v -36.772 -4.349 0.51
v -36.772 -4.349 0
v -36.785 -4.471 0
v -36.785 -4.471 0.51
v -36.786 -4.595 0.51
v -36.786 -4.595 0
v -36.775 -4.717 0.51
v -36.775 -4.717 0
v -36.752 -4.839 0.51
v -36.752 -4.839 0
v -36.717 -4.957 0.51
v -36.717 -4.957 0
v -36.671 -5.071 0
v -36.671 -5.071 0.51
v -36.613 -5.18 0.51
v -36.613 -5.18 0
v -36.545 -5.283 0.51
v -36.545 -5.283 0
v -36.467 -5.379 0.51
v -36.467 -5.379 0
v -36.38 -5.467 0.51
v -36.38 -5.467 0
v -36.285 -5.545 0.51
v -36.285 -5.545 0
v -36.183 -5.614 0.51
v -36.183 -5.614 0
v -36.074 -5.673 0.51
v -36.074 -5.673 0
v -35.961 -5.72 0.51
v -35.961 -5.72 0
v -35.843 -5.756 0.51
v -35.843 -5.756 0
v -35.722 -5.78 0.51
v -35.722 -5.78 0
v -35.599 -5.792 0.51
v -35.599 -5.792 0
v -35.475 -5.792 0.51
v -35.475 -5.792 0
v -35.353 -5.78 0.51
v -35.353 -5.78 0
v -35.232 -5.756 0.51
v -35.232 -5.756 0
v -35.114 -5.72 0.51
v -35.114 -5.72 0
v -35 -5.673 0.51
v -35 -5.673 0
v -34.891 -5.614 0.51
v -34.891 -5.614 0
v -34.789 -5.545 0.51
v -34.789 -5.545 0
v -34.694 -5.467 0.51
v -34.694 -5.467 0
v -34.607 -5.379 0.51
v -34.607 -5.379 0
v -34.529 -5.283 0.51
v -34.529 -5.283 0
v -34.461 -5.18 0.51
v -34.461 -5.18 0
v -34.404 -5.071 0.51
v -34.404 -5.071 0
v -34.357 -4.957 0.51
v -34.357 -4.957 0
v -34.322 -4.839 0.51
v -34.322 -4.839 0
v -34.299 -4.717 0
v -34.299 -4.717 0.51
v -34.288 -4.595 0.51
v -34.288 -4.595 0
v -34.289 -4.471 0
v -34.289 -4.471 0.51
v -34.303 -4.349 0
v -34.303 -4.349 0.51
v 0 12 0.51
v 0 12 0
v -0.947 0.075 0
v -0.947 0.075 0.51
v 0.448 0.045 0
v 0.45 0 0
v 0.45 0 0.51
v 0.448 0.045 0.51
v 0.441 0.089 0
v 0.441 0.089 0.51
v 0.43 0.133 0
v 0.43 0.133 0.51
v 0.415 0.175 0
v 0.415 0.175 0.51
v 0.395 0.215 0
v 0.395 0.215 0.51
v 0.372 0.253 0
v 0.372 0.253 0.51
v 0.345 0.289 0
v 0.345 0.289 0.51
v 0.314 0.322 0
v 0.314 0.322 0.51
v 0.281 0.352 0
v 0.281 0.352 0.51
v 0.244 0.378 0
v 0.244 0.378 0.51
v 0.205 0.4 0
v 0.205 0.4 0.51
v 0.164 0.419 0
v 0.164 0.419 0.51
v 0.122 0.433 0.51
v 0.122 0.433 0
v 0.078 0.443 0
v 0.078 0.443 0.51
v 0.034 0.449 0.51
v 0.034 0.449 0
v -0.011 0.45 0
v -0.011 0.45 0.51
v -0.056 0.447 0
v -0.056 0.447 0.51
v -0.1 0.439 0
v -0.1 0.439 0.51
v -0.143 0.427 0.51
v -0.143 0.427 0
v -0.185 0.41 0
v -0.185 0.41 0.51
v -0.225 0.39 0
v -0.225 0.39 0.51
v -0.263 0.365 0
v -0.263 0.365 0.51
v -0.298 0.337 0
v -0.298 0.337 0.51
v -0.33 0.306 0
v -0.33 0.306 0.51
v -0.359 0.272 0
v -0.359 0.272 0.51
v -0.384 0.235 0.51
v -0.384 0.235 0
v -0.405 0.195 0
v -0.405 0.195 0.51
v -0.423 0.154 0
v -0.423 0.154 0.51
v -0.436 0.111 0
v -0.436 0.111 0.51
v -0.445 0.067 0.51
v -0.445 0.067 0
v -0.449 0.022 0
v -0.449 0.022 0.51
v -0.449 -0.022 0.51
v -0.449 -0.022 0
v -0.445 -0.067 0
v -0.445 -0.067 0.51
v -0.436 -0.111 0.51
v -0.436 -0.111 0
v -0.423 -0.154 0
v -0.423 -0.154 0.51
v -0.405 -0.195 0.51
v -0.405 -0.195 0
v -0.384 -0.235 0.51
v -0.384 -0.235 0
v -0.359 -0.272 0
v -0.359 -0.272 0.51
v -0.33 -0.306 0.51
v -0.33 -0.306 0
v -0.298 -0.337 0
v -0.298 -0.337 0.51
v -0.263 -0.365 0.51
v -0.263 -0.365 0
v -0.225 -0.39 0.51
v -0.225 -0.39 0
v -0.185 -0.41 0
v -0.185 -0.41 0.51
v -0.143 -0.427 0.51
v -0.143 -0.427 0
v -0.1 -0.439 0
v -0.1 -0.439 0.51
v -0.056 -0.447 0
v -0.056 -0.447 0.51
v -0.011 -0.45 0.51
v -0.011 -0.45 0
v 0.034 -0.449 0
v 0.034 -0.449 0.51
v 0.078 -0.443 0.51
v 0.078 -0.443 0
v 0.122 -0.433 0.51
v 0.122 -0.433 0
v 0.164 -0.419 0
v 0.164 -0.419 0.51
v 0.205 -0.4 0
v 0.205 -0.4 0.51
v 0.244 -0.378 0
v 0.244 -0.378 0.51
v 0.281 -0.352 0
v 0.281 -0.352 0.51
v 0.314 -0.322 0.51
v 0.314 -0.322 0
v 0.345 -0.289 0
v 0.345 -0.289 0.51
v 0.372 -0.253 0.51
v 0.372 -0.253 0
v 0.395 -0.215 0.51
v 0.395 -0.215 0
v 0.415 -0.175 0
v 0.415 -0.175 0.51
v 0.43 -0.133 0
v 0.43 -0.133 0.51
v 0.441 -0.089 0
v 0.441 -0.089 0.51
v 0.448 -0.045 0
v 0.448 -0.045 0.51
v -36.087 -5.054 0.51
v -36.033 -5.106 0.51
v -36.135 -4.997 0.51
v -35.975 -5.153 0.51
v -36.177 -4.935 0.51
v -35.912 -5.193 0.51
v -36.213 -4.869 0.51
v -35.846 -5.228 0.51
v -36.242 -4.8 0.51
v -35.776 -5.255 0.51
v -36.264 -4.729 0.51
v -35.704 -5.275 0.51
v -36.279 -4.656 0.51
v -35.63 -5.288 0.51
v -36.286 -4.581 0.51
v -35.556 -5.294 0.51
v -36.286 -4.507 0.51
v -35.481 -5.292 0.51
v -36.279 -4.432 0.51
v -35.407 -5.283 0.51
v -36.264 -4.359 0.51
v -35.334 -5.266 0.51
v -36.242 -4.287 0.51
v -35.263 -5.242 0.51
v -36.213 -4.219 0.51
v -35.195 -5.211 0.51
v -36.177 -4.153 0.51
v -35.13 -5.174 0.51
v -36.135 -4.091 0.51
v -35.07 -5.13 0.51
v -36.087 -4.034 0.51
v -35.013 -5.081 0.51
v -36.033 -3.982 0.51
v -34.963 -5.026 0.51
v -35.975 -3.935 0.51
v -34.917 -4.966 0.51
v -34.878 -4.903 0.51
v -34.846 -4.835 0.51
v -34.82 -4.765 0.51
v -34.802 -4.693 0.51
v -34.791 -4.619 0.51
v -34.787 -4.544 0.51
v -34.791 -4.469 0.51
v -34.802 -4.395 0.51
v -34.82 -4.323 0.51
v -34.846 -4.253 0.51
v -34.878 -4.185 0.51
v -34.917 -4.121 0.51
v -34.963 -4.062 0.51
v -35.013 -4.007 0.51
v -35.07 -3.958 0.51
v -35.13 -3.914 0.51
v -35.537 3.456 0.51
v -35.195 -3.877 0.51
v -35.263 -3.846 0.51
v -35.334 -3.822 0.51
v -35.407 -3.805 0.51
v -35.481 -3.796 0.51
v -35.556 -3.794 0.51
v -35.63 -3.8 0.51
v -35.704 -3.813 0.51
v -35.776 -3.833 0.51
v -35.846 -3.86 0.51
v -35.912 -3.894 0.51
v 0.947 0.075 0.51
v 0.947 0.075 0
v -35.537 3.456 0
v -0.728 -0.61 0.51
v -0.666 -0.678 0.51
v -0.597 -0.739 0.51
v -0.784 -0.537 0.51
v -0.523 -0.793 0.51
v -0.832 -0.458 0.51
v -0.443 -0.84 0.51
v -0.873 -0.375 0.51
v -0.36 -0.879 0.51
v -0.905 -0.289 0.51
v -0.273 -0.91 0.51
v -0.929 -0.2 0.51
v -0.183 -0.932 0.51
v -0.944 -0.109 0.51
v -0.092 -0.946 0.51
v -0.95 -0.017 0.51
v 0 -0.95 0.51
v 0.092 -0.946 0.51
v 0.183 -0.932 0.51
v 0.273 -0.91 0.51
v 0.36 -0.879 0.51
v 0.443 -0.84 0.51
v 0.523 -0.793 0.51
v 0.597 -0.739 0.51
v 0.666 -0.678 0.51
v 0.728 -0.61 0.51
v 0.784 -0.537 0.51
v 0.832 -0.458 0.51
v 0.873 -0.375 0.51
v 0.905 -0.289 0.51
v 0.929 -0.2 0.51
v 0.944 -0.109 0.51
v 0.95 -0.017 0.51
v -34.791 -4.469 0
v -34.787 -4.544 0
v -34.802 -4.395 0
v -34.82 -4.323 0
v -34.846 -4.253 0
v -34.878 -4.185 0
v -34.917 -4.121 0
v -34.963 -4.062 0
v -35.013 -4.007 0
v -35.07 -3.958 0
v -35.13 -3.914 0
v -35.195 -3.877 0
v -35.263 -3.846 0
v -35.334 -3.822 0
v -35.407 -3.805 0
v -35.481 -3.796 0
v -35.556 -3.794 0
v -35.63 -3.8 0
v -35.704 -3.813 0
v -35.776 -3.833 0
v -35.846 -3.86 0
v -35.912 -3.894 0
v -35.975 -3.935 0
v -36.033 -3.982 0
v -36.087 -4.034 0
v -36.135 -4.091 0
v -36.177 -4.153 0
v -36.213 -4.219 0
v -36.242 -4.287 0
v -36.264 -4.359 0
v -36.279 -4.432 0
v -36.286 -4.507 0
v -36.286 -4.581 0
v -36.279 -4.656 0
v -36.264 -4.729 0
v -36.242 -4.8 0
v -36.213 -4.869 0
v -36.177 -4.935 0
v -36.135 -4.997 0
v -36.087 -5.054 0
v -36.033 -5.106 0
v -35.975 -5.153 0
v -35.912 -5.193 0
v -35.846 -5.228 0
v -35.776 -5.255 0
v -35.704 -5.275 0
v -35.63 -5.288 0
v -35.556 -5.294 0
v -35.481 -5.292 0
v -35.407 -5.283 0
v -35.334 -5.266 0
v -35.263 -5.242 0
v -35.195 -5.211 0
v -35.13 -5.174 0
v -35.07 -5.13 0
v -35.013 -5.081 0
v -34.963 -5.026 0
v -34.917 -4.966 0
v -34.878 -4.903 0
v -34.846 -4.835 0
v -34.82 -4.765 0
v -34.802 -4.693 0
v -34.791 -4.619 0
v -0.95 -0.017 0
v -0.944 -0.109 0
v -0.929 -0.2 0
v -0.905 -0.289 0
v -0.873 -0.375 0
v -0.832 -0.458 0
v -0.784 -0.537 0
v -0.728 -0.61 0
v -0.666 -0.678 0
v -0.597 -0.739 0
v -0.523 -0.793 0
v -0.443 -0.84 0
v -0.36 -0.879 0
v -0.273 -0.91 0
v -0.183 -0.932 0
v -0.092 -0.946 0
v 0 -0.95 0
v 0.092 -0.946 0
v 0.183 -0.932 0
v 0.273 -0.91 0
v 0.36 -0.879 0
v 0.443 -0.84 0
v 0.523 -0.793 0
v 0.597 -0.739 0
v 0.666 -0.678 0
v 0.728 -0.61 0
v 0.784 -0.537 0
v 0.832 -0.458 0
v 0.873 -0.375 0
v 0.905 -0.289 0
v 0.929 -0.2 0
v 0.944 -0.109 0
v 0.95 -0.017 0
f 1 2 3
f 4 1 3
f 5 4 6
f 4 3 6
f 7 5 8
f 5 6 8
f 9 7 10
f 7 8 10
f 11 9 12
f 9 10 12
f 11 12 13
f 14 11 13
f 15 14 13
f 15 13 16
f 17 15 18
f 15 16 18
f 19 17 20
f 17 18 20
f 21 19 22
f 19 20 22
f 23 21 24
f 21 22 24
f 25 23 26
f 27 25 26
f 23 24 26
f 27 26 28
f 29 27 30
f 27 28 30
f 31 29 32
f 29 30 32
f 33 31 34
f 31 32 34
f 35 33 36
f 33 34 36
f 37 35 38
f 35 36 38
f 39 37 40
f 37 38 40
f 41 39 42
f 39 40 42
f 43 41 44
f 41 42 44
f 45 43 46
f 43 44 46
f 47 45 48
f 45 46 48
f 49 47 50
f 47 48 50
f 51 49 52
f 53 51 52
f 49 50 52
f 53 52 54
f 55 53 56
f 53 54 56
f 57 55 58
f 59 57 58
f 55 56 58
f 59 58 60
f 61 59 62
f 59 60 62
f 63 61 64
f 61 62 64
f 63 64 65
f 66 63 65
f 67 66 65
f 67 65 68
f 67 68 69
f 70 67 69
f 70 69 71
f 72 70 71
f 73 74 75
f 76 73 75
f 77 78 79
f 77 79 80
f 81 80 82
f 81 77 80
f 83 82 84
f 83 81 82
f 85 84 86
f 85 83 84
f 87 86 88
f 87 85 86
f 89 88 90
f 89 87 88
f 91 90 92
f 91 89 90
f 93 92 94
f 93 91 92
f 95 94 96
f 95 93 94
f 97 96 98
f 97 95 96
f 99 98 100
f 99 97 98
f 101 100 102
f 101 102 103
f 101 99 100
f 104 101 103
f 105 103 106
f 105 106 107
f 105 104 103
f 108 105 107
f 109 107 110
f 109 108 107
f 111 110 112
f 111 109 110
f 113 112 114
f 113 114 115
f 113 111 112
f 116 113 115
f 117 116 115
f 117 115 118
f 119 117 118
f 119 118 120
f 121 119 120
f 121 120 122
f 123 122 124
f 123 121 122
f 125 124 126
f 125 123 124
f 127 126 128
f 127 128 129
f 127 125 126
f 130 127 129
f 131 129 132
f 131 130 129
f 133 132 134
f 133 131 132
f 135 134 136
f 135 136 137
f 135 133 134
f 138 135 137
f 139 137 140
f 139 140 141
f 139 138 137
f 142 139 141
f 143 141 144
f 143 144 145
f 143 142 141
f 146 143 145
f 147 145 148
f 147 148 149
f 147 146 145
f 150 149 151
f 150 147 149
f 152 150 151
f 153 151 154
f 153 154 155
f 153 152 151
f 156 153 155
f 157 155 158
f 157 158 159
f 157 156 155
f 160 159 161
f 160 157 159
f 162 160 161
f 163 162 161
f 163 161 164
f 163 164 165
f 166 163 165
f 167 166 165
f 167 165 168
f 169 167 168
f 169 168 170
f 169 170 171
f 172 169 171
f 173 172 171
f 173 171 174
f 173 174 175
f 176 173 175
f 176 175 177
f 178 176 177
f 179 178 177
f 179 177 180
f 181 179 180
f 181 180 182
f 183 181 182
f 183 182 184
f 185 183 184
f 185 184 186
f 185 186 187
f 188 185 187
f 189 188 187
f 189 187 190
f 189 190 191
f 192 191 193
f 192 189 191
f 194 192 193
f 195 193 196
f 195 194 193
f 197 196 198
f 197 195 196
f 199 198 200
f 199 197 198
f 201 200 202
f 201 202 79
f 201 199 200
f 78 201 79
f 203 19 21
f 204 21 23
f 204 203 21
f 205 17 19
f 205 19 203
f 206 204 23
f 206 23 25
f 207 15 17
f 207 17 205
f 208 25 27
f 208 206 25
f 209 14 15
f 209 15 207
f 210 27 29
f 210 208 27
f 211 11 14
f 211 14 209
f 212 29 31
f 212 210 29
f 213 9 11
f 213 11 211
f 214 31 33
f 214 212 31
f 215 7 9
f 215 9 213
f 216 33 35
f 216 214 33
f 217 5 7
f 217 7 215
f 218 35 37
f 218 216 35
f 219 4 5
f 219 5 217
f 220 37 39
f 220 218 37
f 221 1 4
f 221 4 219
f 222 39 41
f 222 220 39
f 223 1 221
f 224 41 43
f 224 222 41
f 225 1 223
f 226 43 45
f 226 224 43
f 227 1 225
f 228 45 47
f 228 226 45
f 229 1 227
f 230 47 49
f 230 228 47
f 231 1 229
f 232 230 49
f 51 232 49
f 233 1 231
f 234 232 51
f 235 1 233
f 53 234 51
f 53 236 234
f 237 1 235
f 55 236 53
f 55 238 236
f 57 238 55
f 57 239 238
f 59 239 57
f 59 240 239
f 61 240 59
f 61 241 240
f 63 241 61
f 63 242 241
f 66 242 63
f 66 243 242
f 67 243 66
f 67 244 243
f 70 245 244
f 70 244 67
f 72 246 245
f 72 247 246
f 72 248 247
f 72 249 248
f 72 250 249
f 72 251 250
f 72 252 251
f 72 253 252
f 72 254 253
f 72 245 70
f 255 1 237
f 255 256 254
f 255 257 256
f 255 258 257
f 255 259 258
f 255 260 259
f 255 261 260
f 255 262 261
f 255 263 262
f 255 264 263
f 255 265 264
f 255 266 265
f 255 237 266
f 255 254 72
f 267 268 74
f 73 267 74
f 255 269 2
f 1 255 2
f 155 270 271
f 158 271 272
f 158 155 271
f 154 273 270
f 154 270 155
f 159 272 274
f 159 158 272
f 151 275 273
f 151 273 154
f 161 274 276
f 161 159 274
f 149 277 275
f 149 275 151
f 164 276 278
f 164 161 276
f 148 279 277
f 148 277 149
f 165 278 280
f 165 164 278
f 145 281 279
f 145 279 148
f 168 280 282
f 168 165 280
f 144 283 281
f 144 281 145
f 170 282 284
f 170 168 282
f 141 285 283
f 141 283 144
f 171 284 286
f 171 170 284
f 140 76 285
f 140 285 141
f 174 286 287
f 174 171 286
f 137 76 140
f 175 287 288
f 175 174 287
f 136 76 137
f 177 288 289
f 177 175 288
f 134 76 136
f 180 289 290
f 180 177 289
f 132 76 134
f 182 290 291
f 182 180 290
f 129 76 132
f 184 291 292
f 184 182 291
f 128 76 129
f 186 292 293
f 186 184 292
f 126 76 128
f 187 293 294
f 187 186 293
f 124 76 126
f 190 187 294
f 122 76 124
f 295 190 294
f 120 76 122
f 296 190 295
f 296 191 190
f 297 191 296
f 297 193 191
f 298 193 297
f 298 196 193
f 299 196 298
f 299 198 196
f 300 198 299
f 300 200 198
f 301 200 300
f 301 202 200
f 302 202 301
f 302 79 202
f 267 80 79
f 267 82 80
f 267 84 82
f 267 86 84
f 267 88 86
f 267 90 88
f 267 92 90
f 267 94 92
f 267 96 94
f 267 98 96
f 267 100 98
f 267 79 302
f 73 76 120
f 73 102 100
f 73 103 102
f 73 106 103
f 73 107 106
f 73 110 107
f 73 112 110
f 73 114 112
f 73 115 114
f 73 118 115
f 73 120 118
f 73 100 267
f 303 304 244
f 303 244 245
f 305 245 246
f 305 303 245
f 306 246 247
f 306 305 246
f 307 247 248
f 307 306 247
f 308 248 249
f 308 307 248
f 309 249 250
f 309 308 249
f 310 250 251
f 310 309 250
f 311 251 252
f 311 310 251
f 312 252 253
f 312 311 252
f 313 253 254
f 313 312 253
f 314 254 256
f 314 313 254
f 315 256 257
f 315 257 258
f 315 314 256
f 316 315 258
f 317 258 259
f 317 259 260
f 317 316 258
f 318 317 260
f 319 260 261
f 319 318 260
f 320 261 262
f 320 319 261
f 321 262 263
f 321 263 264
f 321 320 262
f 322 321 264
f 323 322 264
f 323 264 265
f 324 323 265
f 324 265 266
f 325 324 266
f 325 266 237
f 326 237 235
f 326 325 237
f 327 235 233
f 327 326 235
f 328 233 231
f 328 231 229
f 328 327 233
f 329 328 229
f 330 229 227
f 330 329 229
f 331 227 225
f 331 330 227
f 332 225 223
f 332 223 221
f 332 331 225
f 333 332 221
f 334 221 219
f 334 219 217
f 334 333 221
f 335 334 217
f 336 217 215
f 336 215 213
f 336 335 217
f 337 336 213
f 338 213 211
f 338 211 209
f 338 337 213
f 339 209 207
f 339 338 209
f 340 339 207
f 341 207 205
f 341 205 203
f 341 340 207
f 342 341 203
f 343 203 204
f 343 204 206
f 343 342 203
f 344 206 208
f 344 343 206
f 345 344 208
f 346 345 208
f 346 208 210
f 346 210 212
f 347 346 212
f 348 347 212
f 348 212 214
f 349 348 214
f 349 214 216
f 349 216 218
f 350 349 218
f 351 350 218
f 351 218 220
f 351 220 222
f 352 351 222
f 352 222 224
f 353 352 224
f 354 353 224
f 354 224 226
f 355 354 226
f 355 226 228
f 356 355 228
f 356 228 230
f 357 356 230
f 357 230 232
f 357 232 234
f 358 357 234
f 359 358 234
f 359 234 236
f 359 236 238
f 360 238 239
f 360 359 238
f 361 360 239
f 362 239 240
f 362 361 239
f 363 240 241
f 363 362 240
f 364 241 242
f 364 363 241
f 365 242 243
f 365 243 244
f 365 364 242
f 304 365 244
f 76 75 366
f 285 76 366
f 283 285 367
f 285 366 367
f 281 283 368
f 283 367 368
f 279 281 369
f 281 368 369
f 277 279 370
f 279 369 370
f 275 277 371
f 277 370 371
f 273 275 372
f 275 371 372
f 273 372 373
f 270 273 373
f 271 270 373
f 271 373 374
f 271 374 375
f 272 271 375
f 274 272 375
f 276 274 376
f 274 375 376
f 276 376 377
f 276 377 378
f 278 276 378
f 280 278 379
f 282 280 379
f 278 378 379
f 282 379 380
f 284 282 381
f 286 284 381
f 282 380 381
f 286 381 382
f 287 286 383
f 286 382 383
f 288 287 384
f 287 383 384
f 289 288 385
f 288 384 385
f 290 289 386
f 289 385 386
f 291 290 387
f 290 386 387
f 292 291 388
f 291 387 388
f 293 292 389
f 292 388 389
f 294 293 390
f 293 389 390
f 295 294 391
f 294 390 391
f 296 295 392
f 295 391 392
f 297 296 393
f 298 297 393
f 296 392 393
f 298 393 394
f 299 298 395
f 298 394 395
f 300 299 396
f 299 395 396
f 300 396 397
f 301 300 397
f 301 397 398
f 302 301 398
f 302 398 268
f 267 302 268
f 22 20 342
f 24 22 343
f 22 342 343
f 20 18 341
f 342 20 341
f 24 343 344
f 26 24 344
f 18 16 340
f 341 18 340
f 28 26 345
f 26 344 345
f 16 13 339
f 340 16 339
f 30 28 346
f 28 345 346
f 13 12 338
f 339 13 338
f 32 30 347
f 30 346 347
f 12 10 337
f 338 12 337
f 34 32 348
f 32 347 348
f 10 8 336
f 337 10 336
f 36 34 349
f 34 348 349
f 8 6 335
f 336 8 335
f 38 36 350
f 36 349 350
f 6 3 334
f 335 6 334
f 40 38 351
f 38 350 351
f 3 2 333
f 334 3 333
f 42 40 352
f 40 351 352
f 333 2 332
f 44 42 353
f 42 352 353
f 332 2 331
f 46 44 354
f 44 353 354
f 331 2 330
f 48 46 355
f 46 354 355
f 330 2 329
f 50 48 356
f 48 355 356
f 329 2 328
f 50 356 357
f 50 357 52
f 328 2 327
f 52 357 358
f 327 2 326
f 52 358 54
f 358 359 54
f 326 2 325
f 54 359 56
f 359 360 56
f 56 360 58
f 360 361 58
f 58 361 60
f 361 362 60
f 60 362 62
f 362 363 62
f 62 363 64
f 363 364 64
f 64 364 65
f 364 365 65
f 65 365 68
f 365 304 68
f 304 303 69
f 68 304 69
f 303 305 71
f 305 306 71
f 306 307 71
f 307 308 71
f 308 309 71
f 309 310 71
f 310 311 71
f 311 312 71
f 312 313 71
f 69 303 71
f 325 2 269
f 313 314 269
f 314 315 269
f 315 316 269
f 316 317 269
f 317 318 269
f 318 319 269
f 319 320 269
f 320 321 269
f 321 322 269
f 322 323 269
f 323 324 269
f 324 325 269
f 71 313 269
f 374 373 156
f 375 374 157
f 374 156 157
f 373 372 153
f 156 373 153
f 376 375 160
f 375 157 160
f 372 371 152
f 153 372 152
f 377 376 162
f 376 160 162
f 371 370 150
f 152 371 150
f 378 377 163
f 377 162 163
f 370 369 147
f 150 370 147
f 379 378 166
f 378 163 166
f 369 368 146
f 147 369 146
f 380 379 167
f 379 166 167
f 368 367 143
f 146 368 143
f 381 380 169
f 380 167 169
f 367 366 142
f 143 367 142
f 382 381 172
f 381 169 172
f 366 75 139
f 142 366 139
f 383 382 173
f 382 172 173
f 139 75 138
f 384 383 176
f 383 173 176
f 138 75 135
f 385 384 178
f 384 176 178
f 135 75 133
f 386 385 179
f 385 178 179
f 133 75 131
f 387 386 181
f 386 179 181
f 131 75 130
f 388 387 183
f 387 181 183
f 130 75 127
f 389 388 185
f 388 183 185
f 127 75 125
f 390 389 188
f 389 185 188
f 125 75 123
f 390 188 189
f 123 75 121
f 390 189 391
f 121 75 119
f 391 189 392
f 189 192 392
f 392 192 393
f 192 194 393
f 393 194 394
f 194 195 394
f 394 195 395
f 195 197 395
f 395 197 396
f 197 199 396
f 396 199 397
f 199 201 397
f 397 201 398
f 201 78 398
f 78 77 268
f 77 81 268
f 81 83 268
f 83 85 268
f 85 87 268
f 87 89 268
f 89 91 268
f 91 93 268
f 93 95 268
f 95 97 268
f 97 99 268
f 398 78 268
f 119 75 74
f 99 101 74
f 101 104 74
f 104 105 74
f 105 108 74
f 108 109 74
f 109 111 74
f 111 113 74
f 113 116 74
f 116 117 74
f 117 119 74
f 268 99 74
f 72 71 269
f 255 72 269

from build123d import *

# Parameters (mm, degrees)
F0_R     = 0.45
F1_DEPTH = 0.51
F2_R     = 0.75
F3_DEPTH = 0.51


with BuildPart() as f1:
    # F0 (on Top) → F1 (new body)
    with BuildSketch(Plane.XY):
        with BuildLine():
            Line((0, 12), (-0.947018, 0.075208))
            ThreePointArc((-0.947018, 0.075208), (0, -0.95), (0.947018, 0.075208))
            Line((0.947018, 0.075208), (0, 12))
        make_face()
        Circle(F0_R, mode=Mode.SUBTRACT)
    extrude(amount=F1_DEPTH)


with BuildPart() as f3:
    # F2 (on Top) → F3 (new body)
    with BuildSketch(Plane.XY):
        with BuildLine():
            Line((-35.537161, 3.456061), (-36.771808, -4.348627))
            ThreePointArc((-36.771808, -4.348627), (-35.537161, -5.793939), (-34.302514, -4.348627))
            Line((-34.302514, -4.348627), (-35.537161, 3.456061))
        make_face()
        with Locations((-35.537161, -4.543939)):
            Circle(F2_R, mode=Mode.SUBTRACT)
    extrude(amount=F3_DEPTH)


solid = Compound([f1.part, f3.part])
